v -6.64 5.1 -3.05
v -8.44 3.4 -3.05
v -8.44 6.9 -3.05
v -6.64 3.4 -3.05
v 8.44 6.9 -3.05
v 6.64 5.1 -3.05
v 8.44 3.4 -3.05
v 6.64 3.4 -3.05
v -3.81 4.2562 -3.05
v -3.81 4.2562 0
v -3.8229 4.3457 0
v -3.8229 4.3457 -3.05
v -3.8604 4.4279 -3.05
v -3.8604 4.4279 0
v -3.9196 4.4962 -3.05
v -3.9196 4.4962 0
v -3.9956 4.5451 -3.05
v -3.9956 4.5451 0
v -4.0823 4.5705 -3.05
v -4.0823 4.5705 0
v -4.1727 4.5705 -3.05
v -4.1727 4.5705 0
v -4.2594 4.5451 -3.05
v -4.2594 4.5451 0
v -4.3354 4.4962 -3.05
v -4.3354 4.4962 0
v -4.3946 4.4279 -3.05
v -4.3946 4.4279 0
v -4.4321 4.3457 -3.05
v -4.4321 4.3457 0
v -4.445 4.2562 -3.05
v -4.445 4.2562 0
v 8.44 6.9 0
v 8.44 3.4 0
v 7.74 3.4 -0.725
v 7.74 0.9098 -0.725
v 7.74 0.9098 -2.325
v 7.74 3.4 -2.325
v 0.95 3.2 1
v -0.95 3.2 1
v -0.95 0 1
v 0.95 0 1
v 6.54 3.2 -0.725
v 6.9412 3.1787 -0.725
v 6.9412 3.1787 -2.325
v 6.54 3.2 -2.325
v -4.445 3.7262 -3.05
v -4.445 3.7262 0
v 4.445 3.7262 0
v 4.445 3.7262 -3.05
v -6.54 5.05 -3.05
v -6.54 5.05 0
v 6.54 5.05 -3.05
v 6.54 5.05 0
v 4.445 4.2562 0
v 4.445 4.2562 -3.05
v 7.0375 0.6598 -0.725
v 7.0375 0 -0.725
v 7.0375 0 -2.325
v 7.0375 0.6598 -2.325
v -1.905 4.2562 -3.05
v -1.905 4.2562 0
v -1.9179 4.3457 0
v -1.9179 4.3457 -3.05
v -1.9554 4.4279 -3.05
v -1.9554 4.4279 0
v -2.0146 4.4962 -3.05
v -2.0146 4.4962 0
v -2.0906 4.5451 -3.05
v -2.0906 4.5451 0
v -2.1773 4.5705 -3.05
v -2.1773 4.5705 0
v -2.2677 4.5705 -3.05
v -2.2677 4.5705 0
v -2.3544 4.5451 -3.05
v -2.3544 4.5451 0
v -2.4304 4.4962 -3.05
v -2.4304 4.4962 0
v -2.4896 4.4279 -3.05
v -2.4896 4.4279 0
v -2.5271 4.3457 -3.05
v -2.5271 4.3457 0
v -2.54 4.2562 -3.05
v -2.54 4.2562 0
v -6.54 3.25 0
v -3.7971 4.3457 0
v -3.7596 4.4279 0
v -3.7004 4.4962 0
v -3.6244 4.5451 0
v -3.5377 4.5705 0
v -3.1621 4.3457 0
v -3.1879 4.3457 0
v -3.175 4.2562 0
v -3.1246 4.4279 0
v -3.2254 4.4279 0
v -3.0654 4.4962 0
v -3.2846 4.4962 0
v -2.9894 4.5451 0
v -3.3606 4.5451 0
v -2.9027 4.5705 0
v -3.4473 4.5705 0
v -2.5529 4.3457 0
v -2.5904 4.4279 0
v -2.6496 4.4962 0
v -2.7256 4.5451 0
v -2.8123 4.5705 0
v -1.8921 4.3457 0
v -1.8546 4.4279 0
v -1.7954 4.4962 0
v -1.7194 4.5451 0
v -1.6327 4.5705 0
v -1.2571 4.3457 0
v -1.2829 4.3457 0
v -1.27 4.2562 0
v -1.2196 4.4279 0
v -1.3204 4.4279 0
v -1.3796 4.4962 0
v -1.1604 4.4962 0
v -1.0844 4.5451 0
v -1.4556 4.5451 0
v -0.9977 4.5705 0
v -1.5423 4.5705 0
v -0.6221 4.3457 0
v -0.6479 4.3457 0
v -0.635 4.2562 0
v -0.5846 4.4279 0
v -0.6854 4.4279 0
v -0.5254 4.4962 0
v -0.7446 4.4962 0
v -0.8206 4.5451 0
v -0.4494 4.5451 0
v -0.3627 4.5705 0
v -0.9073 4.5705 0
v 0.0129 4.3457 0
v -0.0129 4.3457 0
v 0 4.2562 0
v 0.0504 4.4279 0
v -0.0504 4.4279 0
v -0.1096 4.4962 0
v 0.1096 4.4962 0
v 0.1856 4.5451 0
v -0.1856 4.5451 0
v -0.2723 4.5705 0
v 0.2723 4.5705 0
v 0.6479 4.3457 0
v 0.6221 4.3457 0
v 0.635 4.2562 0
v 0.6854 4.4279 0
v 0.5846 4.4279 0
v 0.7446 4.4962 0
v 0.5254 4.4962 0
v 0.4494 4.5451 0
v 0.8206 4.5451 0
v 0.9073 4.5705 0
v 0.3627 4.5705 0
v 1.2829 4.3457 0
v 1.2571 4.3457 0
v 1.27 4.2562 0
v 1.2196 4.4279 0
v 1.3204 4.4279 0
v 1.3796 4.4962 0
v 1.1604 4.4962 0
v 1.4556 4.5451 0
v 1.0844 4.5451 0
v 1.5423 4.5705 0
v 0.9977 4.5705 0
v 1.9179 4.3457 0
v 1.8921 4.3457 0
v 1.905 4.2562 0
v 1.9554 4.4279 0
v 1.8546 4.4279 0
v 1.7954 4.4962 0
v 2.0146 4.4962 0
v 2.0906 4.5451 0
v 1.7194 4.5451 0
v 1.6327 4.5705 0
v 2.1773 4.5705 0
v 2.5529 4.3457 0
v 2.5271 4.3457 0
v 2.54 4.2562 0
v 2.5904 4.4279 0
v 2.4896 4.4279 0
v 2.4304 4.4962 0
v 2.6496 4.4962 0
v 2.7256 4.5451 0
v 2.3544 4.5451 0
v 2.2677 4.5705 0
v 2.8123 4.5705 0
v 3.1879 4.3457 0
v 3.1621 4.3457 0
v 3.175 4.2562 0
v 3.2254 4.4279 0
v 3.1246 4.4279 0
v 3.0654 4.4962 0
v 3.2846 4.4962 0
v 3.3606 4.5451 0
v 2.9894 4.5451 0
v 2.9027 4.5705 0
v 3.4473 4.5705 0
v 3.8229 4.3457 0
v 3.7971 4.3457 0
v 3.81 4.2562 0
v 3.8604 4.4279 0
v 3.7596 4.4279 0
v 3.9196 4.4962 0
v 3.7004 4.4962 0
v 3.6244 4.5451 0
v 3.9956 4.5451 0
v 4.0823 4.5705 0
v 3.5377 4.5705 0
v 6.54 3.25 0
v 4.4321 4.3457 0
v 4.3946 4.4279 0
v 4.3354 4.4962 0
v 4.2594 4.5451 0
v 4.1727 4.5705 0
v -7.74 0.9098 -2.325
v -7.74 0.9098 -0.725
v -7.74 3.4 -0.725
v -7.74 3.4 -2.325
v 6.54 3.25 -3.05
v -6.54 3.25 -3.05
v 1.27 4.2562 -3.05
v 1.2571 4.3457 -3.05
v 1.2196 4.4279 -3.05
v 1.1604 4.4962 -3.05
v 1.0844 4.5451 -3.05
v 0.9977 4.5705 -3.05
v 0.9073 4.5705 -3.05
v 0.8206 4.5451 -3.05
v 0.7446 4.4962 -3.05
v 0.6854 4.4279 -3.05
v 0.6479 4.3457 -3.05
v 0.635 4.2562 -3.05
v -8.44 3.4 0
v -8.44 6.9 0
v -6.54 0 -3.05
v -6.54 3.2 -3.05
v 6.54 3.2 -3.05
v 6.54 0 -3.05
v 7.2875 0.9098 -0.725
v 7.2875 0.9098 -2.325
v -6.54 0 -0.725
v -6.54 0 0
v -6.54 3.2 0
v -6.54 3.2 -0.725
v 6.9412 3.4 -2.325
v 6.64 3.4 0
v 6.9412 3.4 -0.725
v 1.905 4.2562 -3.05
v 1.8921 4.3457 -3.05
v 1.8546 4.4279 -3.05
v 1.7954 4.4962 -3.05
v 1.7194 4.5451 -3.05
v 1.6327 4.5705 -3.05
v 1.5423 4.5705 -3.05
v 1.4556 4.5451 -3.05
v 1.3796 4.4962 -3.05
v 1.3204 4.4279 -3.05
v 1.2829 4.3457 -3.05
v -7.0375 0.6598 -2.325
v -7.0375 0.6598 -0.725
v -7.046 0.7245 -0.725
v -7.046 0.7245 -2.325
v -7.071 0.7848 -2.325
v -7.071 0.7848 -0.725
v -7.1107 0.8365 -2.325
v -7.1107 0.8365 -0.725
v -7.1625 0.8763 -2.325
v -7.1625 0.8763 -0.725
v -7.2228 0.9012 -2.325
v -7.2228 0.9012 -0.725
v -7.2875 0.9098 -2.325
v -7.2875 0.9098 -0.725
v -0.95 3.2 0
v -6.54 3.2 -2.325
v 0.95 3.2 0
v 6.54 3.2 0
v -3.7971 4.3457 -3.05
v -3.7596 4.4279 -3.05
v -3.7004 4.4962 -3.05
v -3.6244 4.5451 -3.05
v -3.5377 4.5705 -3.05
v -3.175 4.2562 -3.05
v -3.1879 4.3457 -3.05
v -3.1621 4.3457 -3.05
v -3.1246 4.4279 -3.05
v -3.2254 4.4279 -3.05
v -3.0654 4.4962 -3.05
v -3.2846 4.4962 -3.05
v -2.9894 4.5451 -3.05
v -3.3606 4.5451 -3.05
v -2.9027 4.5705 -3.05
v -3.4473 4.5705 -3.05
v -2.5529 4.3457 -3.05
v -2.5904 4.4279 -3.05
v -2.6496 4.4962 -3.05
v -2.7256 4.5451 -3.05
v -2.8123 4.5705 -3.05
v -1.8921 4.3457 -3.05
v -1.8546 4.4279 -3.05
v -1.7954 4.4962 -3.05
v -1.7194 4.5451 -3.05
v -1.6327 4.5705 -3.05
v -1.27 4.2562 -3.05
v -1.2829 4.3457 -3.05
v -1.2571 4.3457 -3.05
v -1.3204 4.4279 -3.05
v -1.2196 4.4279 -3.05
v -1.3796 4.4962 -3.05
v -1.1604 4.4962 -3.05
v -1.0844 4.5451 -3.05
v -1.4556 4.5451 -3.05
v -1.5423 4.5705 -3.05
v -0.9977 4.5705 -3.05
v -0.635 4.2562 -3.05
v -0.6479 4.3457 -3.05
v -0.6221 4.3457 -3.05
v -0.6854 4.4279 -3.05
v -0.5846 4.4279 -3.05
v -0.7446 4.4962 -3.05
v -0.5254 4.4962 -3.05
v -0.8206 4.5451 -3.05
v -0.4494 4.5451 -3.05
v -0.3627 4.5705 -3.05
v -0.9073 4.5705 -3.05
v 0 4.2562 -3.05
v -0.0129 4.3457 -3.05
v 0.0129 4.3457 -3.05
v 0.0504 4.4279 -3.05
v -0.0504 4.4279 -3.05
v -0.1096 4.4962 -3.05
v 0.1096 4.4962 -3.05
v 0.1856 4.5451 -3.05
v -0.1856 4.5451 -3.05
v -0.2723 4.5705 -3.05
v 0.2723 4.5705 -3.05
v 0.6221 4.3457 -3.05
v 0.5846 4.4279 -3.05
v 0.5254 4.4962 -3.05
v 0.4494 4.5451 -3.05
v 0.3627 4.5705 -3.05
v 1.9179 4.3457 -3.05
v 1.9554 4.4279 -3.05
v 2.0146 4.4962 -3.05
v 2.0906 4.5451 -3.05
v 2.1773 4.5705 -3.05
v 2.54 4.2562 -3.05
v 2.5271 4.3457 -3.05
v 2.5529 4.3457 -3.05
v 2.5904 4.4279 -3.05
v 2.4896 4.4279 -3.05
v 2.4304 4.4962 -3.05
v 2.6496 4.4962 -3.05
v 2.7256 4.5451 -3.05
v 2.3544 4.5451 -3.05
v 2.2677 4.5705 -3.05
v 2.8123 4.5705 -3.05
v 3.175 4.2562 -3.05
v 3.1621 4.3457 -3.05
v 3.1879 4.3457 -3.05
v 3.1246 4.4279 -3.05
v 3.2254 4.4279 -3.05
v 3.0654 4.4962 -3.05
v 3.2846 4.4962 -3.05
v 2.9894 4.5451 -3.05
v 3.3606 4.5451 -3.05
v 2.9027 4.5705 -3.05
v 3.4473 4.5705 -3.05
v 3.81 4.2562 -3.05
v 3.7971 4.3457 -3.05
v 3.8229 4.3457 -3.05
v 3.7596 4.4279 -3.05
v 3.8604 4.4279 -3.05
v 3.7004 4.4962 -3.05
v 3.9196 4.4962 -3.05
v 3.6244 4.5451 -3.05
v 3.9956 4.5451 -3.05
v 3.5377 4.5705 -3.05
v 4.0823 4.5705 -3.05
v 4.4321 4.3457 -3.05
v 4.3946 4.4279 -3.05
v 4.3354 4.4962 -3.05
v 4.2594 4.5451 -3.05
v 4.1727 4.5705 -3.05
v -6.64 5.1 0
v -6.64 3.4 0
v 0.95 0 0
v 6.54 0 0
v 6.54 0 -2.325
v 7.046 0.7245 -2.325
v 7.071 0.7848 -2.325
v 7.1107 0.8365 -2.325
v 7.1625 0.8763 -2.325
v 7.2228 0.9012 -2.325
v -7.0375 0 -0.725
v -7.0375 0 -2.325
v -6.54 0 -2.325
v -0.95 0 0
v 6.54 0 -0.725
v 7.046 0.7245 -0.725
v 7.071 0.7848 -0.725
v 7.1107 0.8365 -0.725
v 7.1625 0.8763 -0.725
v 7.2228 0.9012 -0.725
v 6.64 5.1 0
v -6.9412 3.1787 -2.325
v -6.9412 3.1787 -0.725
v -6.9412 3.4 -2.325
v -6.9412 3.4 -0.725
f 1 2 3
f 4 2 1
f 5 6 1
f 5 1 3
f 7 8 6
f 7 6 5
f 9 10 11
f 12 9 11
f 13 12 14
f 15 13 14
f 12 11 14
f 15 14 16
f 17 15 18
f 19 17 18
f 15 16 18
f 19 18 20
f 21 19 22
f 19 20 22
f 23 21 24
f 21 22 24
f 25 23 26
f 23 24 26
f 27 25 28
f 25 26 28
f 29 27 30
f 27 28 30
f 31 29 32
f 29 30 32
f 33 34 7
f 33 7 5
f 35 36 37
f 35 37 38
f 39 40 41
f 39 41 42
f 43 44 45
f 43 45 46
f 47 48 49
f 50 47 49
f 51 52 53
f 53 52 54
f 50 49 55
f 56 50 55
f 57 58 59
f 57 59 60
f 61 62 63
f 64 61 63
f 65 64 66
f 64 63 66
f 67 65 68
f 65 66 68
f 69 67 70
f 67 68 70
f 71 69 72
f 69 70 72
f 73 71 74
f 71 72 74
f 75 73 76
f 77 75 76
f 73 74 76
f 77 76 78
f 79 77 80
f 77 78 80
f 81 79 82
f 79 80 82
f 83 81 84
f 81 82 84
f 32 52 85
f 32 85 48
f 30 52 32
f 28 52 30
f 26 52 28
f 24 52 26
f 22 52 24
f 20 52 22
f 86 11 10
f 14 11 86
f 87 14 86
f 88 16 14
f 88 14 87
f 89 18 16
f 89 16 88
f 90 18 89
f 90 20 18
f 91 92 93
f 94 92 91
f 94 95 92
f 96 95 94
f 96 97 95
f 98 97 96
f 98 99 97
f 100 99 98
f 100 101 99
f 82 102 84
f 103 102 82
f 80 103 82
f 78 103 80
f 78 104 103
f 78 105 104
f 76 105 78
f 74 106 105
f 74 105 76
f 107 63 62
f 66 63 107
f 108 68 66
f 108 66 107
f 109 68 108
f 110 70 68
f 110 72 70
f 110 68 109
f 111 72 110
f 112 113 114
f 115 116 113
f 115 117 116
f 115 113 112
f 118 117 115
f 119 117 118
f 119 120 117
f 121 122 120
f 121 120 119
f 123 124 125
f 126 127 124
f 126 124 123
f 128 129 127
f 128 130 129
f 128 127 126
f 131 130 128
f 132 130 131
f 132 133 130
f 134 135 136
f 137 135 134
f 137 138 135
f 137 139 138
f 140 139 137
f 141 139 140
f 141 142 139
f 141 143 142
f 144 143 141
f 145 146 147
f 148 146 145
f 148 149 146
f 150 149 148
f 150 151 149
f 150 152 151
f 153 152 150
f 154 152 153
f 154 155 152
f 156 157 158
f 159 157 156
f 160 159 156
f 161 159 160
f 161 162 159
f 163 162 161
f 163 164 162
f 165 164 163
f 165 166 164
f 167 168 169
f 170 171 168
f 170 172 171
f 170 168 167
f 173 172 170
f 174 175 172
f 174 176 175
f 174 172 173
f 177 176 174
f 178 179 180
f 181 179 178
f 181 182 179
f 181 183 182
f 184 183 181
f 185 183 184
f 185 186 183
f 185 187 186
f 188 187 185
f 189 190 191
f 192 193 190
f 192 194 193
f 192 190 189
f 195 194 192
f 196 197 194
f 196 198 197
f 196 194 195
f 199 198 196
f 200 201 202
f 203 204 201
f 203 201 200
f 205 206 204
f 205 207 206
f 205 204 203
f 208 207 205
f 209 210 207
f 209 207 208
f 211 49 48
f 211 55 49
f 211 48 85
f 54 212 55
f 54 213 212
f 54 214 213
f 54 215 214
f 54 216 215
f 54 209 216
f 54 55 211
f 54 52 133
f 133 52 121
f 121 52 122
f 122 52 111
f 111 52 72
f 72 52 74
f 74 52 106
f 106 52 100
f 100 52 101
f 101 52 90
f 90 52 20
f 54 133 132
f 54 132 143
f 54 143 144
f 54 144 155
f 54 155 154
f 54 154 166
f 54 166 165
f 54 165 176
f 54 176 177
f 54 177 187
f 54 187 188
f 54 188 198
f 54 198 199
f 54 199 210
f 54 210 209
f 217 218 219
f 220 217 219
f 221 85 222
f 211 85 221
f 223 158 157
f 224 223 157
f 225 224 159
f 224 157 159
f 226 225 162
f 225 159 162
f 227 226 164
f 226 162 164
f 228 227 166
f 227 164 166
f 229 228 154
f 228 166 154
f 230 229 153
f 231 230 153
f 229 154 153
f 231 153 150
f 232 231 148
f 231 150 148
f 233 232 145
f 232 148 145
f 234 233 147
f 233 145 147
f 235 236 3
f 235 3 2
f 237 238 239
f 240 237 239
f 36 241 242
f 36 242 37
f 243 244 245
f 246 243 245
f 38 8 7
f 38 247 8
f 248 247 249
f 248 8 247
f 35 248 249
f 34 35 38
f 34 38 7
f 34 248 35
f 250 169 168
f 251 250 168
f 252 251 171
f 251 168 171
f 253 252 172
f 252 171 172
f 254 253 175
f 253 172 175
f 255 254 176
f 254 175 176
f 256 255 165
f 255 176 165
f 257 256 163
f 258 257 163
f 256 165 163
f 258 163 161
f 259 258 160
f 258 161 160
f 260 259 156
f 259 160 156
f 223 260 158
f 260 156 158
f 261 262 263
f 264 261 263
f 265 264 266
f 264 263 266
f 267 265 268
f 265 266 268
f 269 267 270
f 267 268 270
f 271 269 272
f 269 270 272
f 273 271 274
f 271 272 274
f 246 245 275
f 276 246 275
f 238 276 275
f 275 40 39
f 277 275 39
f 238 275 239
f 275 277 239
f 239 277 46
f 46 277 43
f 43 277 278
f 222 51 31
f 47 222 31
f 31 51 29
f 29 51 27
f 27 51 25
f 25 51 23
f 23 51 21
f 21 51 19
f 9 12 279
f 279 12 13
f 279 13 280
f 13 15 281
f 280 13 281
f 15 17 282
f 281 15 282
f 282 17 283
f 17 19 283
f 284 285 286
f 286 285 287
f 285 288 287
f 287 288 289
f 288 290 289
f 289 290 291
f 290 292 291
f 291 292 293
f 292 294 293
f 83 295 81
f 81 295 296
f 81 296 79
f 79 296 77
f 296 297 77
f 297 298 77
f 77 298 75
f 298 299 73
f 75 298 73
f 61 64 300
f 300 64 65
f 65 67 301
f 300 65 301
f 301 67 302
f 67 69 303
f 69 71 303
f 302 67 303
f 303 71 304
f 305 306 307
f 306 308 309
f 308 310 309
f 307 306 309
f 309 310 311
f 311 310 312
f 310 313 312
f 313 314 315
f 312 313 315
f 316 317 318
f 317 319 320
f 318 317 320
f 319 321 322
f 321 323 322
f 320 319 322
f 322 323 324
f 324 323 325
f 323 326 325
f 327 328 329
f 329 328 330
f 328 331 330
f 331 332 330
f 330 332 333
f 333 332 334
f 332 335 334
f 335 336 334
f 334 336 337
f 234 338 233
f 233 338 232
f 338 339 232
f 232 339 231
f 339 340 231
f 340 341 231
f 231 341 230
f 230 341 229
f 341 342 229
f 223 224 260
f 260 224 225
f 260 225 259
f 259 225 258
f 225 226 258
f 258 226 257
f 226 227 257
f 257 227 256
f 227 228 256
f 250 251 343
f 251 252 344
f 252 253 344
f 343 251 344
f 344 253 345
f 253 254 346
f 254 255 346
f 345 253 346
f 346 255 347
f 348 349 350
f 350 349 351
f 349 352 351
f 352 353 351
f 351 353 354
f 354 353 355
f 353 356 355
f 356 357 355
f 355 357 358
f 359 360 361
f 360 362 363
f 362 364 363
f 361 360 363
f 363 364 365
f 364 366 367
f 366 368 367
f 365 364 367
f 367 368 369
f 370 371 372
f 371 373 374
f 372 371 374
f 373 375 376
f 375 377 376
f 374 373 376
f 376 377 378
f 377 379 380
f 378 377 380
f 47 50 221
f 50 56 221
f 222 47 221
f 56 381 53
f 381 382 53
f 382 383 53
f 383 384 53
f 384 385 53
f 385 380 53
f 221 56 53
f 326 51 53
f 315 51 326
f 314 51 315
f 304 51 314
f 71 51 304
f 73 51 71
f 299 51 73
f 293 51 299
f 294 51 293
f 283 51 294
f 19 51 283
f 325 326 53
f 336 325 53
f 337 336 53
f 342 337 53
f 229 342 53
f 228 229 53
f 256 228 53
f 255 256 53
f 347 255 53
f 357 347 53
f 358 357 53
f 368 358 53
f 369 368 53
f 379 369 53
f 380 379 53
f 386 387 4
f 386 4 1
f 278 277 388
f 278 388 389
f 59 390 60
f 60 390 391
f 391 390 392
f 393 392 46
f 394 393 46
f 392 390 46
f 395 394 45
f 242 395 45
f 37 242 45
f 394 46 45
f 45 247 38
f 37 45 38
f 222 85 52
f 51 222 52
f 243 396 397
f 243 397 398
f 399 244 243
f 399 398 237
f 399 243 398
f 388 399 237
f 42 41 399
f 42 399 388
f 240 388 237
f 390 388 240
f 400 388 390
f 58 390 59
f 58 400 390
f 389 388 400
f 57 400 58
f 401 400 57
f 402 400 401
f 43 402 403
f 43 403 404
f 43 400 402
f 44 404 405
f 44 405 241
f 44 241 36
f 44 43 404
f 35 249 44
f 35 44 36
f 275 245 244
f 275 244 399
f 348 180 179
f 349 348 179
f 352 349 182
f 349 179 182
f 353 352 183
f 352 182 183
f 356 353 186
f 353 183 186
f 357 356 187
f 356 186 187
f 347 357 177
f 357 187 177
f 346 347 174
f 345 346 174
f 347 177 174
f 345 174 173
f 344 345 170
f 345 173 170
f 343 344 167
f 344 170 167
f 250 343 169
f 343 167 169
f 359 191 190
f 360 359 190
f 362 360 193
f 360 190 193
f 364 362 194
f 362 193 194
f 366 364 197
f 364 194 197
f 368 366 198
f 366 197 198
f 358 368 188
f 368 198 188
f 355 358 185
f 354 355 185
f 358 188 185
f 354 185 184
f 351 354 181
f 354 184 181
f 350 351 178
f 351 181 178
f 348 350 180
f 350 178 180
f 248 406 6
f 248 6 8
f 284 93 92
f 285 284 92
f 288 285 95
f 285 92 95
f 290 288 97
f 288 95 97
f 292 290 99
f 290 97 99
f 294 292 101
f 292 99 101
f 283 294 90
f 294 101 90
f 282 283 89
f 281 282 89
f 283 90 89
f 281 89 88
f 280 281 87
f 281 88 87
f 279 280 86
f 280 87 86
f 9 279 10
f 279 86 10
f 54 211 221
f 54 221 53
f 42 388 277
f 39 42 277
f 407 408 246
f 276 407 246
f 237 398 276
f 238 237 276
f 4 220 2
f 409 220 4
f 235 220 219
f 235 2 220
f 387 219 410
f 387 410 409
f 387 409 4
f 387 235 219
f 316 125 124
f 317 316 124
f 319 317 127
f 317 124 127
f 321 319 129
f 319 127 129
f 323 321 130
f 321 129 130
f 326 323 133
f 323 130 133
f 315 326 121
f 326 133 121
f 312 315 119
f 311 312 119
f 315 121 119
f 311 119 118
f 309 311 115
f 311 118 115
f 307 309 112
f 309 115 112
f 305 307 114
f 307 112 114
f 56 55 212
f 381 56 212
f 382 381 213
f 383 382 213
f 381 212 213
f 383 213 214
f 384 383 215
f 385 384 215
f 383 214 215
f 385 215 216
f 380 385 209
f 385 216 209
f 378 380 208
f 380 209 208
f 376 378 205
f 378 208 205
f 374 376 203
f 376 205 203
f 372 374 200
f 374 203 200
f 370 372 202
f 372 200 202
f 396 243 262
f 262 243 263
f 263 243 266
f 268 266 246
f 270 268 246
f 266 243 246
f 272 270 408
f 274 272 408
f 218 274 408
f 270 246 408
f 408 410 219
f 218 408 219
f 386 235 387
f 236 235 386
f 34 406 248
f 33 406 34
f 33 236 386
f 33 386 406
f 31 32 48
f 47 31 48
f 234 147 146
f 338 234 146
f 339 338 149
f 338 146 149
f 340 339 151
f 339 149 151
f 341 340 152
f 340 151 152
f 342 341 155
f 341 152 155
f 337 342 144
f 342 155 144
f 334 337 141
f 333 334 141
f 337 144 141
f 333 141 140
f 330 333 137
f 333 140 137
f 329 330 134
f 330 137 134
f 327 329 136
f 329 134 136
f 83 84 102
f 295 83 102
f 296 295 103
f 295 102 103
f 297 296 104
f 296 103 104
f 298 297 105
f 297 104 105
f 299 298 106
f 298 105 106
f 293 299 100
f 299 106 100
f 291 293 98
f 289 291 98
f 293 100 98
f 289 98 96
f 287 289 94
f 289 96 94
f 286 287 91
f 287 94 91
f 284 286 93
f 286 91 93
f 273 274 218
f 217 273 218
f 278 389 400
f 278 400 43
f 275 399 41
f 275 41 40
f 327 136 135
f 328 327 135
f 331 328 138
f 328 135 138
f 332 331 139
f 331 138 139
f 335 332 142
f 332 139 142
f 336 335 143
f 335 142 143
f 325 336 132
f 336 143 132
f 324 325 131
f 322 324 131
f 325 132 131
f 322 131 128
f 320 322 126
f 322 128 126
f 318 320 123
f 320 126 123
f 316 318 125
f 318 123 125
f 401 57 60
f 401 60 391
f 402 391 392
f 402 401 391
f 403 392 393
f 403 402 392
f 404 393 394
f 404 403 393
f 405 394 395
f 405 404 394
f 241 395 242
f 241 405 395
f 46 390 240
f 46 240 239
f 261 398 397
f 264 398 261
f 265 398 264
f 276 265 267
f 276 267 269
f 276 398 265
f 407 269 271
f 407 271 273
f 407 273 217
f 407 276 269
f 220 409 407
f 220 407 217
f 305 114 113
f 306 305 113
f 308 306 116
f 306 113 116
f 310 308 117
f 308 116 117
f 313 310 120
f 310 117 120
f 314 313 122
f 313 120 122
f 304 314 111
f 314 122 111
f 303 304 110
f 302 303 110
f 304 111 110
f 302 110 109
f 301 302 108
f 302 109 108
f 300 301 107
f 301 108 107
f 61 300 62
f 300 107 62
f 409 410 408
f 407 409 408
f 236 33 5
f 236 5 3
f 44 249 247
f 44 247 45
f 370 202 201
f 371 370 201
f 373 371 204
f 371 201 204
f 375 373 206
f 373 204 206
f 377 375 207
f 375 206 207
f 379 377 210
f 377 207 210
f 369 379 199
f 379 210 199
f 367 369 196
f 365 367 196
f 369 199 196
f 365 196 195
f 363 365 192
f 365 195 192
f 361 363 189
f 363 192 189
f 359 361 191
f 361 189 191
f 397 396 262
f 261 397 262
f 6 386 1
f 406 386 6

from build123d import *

# Parameters (mm, degrees)
SKETCH1_W            = 13.08
SKETCH1_H            = 3.2
BOSS_EXTRUDE1_DEPTH  = 3.05
BOSS_EXTRUDE2_START  = -0.725
BOSS_EXTRUDE2_DEPTH  = 1.6
SKETCH4_W            = 1.9
SKETCH4_H            = 3.2
POLARIZING_KEY_DEPTH = 1
SKETCH5_W            = 13.08
SKETCH5_H            = 1.8
CABLE_CLIP_DEPTH     = 3.05
BOSS_EXTRUDE5_REACH  = 12.496


with BuildPart() as part:
    # Sketch1 → Boss-Extrude1 (new body)
    with BuildSketch(Plane.XY):
        with Locations((0, 1.6)):
            Rectangle(SKETCH1_W, SKETCH1_H)
    extrude(amount=-BOSS_EXTRUDE1_DEPTH)

    # Sketch2 → Boss-Extrude2 (add)
    with BuildSketch(Plane.XY.offset(BOSS_EXTRUDE2_START)):
        with BuildLine():
            Line((6.54, 0), (7.037478352, 0))
            Line((7.037478352, 0), (7.037478352, 0.659767292))
            ThreePointArc((7.037478352, 0.659767292), (7.110701657, 0.836543987), (7.287478352, 0.909767292))
            Line((7.287478352, 0.909767292), (7.74, 0.909767292))
            Line((7.74, 0.909767292), (7.74, 6.4))
            Line((7.74, 6.4), (6.941198514, 6.4))
            Line((6.941198514, 6.4), (6.941198514, 3.178710063))
            Line((6.941198514, 3.178710063), (6.54, 3.2))
            Line((6.54, 3.2), (6.54, 0))
        make_face()
        with BuildLine():
            Line((-6.54, 3.2), (-6.54, 0))
            Line((-6.54, 0), (-7.037478352, 0))
            Line((-7.037478352, 0), (-7.037478352, 0.659767292))
            ThreePointArc((-7.037478352, 0.659767292), (-7.110701657, 0.836543987), (-7.287478352, 0.909767292))
            Line((-7.287478352, 0.909767292), (-7.74, 0.909767292))
            Line((-7.74, 0.909767292), (-7.74, 6.4))
            Line((-7.74, 6.4), (-6.941198514, 6.4))
            Line((-6.941198514, 6.4), (-6.941198514, 3.178710063))
            Line((-6.941198514, 3.178710063), (-6.54, 3.2))
        make_face()
    extrude(amount=-BOSS_EXTRUDE2_DEPTH)

    # Sketch4 → Polarizing key (add)
    with BuildSketch(Plane.XY):
        with Locations((0, 1.6)):
            Rectangle(SKETCH4_W, SKETCH4_H)
    extrude(amount=POLARIZING_KEY_DEPTH)

    # Boss-Extrude5: up to this face of the body (flat: up to its plane)
    boss_extrude5_end = Plane(part.part.faces().sort_by_distance((0, 1.6, -3.05))[0])
    # Sketch6 → Boss-Extrude5 (add, up to the picked face)
    with BuildSketch(Plane.XY, mode=Mode.PRIVATE) as boss_extrude5_sk1:
        Polygon((-8.44, 3.4), (-6.64, 3.4), (-6.64, 5.1), (6.64, 5.1), (6.64, 3.4), (8.44, 3.4), (8.44, 6.9), (-8.44, 6.9), align=None)
    boss_extrude5_tool1 = split(extrude(boss_extrude5_sk1.sketch, amount=-BOSS_EXTRUDE5_REACH, mode=Mode.PRIVATE), bisect_by=boss_extrude5_end, keep=Keep.BOTH, mode=Mode.PRIVATE)
    add(boss_extrude5_tool1.solids().sort_by(Axis((0, 5.706607, 0), (0, 0, -1)))[0])


with BuildPart() as body_2:
    # Sketch5 → Cable clip (new body)
    with BuildSketch(Plane.XY):
        with Locations((0, 4.15)):
            Rectangle(SKETCH5_W, SKETCH5_H)
        with BuildLine():
            Line((-4.445, 3.72625), (4.445, 3.72625))
            Line((4.445, 3.72625), (4.445, 4.25625))
            ThreePointArc((4.445, 4.25625), (4.1275, 4.57375), (3.81, 4.25625))
            ThreePointArc((3.81, 4.25625), (3.4925, 4.57375), (3.175, 4.25625))
            ThreePointArc((3.175, 4.25625), (2.8575, 4.57375), (2.54, 4.25625))
            ThreePointArc((2.54, 4.25625), (2.2225, 4.57375), (1.905, 4.25625))
            ThreePointArc((1.905, 4.25625), (1.5875, 4.57375), (1.27, 4.25625))
            ThreePointArc((1.27, 4.25625), (0.9525, 4.57375), (0.635, 4.25625))
            ThreePointArc((0.635, 4.25625), (0.3175, 4.57375), (0, 4.25625))
            ThreePointArc((0, 4.25625), (-0.3175, 4.57375), (-0.635, 4.25625))
            ThreePointArc((-0.635, 4.25625), (-0.9525, 4.57375), (-1.27, 4.25625))
            ThreePointArc((-1.27, 4.25625), (-1.5875, 4.57375), (-1.905, 4.25625))
            ThreePointArc((-1.905, 4.25625), (-2.2225, 4.57375), (-2.54, 4.25625))
            ThreePointArc((-2.54, 4.25625), (-2.8575, 4.57375), (-3.175, 4.25625))
            ThreePointArc((-3.175, 4.25625), (-3.4925, 4.57375), (-3.81, 4.25625))
            ThreePointArc((-3.81, 4.25625), (-4.1275, 4.57375), (-4.445, 4.25625))
            Line((-4.445, 4.25625), (-4.445, 3.72625))
        make_face(mode=Mode.SUBTRACT)
    extrude(amount=-CABLE_CLIP_DEPTH)


solid = Compound([part.part, body_2.part])
